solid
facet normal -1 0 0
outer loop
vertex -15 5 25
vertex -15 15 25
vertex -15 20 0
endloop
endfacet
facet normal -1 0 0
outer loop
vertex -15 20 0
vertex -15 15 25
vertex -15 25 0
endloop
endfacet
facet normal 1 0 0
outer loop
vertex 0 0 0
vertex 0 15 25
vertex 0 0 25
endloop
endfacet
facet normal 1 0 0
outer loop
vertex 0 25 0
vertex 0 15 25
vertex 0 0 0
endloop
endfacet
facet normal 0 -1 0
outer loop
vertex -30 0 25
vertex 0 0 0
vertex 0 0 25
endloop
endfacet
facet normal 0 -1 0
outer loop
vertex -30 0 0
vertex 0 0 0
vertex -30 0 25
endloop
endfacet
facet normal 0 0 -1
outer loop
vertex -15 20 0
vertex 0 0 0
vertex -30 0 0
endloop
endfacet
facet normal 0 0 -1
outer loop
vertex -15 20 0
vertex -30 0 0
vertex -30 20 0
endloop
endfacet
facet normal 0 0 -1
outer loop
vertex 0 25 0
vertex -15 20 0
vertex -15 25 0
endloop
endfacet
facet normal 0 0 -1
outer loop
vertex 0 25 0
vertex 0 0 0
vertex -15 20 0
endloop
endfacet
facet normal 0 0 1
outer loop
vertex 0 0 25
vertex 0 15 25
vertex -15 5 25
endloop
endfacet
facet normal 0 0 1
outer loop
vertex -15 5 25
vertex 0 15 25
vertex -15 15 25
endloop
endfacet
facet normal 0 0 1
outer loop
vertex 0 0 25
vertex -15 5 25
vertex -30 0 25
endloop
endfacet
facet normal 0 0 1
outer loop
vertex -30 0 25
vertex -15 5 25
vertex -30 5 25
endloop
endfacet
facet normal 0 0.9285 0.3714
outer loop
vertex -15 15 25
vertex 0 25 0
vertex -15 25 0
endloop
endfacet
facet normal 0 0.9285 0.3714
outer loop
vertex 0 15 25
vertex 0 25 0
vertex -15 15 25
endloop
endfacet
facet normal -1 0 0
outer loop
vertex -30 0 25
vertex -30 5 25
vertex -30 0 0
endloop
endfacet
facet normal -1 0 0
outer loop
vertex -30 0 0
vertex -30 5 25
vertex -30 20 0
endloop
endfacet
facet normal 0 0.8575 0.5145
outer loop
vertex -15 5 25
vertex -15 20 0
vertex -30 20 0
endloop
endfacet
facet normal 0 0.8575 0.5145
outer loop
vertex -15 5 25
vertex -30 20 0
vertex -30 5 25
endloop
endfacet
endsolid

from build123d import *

# Parameters (mm, degrees)
BOSS_EXTRUDE1_DEPTH = 25
BOSS_EXTRUDE2_DEPTH = 15
BOSS_EXTRUDE3_DEPTH = 15


with BuildPart() as part:
    # Sketch1 → Boss-Extrude1 (new body)
    with BuildSketch(Plane.XY):
        Polygon((-30, 5), (-15, 5), (-15, 15), (0, 15), (0, 0), (-30, 0), align=None)
    extrude(amount=BOSS_EXTRUDE1_DEPTH)

    # Sketch2 → Boss-Extrude2 (add)
    with BuildSketch(Plane(origin=(0, 0, 0), x_dir=(0, 0, -1), z_dir=(1, 0, 0))):
        Polygon((0, 15), (0, 25), (-25, 15), align=None)
    extrude(amount=-BOSS_EXTRUDE2_DEPTH)

    # Sketch3 → Boss-Extrude3 (add)
    with BuildSketch(Plane.ZY.offset(15)):
        Polygon((0, 5), (0, 20), (25, 5), align=None)
    extrude(amount=BOSS_EXTRUDE3_DEPTH)


solid = part.part
